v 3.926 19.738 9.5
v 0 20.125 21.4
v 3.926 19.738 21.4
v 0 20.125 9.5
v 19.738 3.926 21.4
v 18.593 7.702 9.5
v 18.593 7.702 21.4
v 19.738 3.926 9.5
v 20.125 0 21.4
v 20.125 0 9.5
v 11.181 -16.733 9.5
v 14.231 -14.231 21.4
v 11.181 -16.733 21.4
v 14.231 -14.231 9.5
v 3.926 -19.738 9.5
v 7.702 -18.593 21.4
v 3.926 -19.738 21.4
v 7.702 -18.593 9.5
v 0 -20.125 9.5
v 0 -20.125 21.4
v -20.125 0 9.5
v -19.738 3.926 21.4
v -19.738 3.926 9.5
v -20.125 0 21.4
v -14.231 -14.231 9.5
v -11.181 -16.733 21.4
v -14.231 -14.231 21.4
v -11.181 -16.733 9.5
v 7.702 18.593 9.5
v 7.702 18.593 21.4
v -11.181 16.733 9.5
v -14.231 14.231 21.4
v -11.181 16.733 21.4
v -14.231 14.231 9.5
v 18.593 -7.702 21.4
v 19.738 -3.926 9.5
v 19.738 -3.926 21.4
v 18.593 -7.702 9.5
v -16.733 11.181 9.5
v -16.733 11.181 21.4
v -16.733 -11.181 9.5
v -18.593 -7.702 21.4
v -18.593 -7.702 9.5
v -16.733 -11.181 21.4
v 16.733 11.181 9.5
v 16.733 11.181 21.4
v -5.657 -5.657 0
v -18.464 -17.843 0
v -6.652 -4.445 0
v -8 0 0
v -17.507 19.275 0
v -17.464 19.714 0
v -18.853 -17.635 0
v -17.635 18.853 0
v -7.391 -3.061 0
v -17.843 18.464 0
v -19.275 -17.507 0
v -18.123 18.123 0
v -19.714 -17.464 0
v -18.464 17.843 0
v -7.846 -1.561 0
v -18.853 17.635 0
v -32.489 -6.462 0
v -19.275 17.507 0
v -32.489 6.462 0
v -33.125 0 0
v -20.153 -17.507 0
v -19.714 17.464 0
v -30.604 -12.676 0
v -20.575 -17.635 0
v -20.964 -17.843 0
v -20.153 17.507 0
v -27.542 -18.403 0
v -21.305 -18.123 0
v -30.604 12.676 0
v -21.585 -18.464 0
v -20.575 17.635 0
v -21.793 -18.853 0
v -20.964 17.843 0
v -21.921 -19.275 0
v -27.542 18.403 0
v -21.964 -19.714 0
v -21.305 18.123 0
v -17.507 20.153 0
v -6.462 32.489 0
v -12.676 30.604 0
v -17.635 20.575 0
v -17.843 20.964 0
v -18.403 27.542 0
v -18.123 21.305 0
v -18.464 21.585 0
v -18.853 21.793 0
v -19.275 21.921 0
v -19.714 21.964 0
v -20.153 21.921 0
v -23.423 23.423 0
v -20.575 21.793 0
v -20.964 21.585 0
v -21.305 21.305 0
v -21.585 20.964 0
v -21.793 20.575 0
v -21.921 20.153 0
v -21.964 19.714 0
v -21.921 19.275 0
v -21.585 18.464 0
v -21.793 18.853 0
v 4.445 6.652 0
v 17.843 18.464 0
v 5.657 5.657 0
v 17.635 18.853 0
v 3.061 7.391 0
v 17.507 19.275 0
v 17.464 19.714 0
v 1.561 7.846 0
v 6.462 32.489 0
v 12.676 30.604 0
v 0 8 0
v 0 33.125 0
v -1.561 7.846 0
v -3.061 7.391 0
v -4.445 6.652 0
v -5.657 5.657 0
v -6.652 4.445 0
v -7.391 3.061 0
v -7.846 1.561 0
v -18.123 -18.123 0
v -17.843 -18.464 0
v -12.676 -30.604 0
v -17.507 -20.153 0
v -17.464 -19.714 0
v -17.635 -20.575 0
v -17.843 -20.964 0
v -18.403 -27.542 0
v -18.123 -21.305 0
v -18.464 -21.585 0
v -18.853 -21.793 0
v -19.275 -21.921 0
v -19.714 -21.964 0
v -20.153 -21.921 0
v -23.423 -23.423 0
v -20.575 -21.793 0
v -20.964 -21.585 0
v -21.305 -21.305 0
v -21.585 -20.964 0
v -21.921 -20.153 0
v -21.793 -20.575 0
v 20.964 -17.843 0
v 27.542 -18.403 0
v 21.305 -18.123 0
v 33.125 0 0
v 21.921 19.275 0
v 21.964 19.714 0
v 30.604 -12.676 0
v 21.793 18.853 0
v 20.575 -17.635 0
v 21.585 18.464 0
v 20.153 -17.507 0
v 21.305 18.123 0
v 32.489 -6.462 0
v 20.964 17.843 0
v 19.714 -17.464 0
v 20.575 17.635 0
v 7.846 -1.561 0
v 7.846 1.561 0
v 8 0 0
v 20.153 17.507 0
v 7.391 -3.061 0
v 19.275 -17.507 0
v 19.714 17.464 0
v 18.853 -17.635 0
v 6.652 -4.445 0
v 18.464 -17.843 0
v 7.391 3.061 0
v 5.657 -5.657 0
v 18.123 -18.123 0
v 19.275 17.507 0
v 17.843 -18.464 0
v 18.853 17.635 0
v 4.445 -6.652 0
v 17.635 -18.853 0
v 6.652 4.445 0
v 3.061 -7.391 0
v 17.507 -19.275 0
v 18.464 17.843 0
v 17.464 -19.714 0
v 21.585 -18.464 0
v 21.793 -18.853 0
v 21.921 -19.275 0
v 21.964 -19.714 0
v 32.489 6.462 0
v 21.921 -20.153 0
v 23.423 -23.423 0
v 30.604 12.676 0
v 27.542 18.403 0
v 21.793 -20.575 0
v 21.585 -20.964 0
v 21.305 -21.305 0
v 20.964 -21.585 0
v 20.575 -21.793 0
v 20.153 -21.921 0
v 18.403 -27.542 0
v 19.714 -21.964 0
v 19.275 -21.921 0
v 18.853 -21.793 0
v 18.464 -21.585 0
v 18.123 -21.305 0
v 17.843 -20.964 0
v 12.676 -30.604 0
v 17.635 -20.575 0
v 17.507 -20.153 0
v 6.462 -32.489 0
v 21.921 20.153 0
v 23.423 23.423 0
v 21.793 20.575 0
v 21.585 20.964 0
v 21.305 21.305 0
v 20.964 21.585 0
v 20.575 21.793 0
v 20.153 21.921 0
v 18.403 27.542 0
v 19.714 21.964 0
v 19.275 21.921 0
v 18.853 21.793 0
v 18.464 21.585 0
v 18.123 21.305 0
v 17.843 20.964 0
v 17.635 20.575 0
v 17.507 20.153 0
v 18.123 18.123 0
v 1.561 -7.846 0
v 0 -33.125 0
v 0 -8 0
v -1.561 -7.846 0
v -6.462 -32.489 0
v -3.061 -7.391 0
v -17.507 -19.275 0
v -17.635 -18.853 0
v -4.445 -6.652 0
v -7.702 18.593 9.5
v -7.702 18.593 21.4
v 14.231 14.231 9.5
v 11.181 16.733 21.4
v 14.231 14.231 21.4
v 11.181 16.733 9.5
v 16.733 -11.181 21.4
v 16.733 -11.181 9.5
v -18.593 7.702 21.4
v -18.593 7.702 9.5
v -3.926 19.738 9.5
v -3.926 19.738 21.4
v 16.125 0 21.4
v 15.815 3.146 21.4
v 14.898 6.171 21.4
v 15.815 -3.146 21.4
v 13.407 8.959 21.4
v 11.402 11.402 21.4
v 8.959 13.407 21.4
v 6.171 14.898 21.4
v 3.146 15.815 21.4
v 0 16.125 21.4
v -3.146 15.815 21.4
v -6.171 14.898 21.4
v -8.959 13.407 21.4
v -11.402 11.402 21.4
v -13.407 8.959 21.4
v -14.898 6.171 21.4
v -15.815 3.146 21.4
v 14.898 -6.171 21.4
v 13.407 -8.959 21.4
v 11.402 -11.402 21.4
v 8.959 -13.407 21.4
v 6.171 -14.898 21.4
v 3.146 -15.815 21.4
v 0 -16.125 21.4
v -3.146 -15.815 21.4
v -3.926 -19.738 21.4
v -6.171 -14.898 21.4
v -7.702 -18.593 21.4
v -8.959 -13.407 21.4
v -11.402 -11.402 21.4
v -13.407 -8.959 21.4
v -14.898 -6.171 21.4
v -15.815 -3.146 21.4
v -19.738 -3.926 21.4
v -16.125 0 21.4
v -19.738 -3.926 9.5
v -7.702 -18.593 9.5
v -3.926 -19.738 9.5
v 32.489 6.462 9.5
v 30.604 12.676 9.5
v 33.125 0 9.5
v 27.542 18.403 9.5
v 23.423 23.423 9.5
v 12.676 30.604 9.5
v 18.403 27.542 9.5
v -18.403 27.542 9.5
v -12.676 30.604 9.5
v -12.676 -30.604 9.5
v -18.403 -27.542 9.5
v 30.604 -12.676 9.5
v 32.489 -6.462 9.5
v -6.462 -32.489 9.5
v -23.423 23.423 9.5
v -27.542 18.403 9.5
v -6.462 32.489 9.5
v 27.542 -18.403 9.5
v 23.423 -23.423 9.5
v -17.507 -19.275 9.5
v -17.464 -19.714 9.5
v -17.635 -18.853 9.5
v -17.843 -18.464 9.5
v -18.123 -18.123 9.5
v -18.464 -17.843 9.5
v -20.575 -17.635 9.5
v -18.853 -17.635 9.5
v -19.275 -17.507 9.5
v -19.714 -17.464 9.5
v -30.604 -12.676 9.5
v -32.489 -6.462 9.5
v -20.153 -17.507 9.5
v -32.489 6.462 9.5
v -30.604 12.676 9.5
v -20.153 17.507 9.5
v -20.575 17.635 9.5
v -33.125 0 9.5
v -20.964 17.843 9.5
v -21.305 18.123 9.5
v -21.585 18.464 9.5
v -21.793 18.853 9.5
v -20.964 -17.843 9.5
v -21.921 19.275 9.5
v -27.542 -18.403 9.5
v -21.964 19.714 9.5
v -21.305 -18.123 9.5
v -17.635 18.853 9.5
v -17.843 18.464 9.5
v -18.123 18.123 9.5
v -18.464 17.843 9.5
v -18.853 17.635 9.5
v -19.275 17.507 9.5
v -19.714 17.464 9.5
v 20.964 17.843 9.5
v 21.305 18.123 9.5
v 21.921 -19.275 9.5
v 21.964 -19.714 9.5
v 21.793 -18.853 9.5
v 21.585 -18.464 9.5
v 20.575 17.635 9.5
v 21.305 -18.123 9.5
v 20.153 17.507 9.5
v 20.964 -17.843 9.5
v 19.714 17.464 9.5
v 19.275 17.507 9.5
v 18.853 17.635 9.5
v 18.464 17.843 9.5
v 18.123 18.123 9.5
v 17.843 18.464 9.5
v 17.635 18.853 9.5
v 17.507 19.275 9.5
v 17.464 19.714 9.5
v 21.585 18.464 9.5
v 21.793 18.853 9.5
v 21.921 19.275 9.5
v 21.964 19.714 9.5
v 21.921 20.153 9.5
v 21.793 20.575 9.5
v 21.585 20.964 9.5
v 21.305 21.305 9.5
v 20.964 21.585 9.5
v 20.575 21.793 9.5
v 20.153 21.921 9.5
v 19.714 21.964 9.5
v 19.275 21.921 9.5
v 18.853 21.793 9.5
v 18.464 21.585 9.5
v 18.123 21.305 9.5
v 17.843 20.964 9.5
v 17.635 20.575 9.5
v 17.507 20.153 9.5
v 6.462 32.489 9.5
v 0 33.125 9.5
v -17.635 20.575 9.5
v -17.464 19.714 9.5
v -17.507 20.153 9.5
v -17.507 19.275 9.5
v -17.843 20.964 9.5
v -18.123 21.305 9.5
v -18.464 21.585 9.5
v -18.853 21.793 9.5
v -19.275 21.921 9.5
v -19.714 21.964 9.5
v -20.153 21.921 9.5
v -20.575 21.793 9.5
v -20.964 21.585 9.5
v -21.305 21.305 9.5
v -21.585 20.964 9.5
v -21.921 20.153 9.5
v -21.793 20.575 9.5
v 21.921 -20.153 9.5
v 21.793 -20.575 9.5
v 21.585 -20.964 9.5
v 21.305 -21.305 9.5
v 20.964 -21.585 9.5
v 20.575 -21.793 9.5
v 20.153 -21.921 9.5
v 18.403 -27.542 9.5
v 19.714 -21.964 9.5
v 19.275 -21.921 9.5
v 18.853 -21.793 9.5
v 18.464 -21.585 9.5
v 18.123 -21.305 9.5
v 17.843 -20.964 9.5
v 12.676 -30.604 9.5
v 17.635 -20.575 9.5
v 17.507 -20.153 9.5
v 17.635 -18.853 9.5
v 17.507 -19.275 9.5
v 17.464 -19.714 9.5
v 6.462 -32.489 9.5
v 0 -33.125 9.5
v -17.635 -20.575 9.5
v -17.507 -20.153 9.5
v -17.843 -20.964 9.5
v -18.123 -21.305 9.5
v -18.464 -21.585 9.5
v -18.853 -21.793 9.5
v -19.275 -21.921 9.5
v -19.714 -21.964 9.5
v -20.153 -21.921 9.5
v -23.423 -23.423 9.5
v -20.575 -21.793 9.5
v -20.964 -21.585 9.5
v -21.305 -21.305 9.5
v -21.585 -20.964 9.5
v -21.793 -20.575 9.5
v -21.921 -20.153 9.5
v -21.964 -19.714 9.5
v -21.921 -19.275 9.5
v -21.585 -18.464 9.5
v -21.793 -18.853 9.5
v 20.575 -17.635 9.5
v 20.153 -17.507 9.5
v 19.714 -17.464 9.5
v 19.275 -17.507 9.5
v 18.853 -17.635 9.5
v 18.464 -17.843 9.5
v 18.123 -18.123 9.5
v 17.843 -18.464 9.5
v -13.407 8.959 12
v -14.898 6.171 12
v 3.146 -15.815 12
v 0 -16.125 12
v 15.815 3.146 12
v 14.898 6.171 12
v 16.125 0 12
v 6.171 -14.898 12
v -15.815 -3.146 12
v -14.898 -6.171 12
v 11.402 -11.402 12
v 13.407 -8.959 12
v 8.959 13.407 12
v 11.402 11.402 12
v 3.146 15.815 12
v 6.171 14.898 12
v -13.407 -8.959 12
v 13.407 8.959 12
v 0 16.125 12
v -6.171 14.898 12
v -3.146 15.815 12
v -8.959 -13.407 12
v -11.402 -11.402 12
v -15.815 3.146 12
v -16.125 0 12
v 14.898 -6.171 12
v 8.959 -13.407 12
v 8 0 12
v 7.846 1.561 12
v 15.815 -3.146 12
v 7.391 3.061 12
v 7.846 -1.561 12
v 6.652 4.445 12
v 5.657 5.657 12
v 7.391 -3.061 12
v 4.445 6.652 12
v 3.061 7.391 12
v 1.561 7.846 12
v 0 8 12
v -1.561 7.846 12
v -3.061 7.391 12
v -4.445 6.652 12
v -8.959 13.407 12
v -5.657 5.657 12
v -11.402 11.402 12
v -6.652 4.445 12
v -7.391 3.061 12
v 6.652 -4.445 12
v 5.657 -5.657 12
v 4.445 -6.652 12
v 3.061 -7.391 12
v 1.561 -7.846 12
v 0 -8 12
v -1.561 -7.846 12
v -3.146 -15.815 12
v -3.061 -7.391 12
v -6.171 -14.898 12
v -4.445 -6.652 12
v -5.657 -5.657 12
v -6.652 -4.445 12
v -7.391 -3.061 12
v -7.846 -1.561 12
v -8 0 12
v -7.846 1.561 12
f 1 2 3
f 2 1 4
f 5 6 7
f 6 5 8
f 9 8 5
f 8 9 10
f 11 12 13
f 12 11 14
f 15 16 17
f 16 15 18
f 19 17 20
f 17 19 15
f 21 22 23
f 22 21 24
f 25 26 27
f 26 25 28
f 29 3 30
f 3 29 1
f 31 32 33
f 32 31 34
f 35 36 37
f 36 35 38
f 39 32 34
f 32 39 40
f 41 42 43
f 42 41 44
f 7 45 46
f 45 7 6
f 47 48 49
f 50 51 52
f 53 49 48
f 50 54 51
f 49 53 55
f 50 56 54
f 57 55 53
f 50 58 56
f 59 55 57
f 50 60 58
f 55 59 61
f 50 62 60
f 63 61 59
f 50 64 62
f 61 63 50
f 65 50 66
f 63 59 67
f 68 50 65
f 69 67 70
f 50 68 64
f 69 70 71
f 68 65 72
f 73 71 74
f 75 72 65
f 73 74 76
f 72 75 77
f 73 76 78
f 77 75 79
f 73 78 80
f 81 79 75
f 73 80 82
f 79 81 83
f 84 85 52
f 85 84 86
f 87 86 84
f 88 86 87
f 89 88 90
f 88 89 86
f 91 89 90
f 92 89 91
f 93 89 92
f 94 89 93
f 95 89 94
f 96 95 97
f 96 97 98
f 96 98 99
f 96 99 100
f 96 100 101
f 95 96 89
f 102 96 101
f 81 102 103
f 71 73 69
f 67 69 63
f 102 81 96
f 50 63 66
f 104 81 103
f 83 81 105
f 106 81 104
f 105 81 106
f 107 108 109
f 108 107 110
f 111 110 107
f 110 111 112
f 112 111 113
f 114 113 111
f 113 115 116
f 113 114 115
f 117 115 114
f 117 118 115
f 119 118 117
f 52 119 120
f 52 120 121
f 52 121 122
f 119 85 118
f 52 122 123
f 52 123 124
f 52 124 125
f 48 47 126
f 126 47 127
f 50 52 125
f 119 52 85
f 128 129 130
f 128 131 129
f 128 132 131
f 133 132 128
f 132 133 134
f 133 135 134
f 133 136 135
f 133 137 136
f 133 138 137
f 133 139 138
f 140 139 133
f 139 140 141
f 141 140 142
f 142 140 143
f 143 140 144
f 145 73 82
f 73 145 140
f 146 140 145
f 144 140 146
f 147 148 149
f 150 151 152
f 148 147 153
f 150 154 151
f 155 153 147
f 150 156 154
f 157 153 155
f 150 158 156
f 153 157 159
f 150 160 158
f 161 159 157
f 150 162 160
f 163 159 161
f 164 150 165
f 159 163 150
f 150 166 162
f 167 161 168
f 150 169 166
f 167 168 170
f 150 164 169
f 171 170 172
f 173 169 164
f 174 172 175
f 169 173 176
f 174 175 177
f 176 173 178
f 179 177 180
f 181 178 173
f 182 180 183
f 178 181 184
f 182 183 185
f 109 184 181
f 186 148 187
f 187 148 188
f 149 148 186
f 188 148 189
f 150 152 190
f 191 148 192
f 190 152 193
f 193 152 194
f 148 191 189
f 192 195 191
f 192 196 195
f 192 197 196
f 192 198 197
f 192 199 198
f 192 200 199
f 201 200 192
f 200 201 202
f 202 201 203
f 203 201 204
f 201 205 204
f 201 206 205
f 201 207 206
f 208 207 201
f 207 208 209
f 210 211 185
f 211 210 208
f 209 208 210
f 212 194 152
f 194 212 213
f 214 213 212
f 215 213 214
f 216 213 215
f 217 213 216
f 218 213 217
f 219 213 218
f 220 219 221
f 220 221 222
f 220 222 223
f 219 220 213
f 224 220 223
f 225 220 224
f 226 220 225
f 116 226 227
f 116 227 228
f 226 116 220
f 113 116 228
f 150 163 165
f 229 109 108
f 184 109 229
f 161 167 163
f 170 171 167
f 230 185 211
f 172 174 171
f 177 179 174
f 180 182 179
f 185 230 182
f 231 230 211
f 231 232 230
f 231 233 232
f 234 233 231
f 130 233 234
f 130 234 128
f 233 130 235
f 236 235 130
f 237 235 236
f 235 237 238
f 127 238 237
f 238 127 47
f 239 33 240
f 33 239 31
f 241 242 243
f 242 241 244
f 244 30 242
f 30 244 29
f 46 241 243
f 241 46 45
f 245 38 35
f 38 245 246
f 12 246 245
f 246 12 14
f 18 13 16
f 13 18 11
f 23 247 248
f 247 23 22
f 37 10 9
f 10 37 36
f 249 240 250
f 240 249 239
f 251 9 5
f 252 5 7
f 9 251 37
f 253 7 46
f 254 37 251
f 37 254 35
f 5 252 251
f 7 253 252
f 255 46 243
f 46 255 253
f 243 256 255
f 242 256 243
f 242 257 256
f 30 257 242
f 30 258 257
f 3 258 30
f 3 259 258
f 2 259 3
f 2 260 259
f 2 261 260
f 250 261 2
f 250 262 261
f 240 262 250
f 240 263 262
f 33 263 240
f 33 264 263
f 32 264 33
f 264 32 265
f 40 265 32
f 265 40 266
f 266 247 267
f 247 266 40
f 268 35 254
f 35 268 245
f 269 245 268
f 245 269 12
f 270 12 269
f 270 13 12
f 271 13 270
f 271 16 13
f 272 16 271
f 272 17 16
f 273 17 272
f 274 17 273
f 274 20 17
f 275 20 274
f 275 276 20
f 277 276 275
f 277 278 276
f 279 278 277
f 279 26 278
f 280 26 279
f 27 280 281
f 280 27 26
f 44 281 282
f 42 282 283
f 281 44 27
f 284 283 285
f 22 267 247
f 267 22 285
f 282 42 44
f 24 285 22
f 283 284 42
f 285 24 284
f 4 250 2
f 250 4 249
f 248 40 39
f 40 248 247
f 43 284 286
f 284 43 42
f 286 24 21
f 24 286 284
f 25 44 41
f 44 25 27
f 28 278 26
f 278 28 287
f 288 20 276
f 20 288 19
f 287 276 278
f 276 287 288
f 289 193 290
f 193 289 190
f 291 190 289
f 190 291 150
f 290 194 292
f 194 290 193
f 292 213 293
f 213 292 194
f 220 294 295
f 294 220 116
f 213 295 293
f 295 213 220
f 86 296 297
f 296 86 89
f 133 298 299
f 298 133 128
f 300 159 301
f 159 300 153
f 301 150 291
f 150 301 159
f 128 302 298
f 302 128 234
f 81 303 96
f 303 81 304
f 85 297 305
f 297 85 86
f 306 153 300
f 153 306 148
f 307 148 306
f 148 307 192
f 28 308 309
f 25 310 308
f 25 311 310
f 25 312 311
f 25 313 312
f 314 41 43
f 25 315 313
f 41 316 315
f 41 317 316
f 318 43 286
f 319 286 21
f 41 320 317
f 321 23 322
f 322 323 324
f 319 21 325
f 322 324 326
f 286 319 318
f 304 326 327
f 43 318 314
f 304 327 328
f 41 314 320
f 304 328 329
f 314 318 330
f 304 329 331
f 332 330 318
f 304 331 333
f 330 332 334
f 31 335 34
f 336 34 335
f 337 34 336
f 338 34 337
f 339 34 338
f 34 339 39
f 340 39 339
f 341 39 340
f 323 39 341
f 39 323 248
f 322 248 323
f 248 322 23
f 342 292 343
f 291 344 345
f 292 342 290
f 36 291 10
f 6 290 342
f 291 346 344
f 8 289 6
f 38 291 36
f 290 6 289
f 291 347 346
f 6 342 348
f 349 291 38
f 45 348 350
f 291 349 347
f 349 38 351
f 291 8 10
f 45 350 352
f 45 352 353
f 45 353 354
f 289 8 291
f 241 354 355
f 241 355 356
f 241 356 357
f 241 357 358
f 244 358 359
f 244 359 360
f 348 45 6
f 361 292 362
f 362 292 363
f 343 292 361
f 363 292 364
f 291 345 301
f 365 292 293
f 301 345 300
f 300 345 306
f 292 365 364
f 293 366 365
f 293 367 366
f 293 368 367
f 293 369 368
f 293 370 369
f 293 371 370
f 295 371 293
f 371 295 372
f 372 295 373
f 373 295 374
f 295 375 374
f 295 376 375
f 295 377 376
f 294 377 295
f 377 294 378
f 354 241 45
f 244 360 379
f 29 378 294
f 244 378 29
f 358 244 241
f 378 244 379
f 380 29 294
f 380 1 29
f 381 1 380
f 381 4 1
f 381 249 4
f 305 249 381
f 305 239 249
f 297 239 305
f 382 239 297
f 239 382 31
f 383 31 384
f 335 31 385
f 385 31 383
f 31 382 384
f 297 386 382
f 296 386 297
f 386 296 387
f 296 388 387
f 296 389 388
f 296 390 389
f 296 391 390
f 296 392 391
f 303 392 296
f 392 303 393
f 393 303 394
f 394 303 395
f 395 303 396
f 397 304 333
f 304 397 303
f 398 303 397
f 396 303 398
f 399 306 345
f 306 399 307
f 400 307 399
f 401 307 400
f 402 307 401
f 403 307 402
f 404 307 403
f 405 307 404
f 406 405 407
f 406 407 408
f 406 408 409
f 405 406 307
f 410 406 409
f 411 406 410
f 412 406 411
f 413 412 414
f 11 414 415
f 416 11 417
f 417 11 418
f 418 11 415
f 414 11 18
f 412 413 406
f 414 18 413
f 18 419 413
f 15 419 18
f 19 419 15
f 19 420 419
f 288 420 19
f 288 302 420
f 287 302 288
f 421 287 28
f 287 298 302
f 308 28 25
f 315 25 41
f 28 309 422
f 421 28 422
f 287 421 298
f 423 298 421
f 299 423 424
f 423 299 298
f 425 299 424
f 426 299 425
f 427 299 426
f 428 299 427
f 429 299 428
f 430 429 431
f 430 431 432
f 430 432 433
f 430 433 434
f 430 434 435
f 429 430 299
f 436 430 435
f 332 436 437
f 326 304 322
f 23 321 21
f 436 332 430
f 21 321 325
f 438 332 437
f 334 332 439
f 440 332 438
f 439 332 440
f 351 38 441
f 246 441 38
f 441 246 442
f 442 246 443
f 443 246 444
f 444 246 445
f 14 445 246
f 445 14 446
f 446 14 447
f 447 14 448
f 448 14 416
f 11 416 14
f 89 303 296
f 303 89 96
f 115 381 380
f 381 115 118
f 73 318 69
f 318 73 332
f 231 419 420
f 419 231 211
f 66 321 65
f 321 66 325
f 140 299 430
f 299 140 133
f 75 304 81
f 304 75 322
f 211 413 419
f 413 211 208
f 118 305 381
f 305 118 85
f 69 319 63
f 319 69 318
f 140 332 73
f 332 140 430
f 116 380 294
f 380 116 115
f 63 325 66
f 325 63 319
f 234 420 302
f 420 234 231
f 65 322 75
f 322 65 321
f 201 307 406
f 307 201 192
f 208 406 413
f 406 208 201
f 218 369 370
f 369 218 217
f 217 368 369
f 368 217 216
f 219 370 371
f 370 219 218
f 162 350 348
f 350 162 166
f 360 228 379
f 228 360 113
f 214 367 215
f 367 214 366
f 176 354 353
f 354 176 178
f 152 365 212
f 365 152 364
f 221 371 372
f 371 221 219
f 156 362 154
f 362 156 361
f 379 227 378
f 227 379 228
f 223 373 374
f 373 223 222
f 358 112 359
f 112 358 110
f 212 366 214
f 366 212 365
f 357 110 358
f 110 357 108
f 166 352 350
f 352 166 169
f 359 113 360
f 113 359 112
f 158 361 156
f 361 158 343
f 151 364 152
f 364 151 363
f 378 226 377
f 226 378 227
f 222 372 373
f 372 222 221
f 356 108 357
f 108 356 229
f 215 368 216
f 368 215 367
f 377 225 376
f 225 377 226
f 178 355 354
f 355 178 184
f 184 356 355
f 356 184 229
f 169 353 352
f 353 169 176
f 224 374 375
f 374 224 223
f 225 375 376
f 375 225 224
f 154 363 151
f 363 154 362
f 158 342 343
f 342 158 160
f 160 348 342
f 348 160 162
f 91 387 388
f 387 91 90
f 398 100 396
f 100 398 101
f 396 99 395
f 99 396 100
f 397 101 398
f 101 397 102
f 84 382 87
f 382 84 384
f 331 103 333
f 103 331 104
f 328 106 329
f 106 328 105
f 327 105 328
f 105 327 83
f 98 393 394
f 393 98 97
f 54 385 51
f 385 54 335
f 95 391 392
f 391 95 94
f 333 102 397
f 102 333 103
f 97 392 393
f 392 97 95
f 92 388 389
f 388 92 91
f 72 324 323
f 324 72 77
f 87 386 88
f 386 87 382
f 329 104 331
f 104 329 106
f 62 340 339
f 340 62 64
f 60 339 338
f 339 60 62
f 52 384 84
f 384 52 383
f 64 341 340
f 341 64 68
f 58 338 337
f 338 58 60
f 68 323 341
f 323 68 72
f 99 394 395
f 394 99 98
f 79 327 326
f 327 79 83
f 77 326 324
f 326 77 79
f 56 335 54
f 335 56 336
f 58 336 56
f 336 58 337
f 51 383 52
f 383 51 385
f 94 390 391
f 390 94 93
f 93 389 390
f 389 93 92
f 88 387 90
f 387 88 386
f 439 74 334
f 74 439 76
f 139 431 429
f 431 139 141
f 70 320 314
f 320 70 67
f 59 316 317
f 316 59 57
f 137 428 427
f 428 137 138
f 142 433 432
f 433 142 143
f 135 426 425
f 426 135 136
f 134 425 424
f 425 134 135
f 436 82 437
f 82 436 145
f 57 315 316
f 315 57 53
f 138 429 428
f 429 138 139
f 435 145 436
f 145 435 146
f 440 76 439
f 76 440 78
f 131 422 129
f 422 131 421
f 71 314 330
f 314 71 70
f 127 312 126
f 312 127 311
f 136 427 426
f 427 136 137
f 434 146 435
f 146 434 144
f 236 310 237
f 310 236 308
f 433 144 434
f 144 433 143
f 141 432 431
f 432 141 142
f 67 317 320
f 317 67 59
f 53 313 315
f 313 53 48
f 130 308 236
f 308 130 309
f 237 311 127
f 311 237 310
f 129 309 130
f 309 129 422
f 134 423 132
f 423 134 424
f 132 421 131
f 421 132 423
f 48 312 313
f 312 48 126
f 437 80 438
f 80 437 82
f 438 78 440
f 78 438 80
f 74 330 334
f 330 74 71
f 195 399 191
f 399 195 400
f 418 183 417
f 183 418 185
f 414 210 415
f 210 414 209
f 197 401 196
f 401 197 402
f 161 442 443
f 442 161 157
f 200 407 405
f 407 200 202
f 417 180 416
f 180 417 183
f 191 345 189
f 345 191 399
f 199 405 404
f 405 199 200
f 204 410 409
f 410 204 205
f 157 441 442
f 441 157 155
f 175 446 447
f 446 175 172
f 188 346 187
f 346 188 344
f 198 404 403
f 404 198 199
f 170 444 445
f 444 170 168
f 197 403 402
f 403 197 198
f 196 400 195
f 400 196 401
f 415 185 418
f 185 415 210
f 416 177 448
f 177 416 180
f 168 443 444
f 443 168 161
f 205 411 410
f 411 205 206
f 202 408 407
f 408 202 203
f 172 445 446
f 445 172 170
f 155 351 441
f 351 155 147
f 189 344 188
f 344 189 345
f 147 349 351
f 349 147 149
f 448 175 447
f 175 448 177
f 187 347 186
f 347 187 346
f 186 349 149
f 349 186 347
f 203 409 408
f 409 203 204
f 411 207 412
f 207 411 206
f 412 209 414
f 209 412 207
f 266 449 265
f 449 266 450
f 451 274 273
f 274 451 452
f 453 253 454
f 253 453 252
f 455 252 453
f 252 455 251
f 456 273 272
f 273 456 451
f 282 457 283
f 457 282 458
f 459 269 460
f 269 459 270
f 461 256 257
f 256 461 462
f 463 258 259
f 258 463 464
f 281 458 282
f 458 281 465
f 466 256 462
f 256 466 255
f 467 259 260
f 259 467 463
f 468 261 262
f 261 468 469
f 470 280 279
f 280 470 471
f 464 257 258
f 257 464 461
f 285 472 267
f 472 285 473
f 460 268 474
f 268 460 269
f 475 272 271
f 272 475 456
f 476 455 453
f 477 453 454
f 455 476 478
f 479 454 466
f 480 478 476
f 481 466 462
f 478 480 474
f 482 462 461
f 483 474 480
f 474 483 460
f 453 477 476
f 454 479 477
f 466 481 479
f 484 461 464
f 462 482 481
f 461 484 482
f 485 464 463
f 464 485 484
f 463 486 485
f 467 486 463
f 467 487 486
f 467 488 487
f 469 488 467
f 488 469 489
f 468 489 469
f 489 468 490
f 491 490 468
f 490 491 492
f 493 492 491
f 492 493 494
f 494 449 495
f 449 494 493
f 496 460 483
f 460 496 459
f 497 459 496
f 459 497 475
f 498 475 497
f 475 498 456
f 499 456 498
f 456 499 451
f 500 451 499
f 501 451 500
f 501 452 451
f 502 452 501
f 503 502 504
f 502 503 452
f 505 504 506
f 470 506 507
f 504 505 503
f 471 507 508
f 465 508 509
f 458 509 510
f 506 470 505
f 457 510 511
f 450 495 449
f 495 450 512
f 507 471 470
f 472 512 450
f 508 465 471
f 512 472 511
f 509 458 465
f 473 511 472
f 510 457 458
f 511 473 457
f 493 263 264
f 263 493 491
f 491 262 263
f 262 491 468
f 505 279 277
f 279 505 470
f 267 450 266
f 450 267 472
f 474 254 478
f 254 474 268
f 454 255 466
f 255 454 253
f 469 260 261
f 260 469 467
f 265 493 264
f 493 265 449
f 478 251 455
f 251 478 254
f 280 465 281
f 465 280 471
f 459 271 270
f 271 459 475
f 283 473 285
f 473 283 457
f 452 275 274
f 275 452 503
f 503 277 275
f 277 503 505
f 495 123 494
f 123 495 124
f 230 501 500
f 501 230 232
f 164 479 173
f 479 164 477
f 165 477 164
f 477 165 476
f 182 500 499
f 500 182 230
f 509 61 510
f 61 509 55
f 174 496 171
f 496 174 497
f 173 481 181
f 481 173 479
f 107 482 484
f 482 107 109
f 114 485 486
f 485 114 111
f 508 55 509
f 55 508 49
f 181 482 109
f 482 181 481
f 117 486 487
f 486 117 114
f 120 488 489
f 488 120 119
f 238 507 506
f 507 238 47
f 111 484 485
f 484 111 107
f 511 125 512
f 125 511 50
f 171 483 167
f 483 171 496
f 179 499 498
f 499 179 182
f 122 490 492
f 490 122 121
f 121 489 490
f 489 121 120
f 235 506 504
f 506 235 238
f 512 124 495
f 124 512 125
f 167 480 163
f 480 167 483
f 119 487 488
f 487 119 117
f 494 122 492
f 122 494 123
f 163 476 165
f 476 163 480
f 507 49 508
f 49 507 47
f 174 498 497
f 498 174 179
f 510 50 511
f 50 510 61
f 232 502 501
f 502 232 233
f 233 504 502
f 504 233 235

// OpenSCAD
$fn = 32;

// ----------------------------------------------------------------------
// Bearing housing: seat for 6002 (32 x 9 mm), 40.25 mm body
// ----------------------------------------------------------------------

// --- parameters (mm) ---
housing_d = 40.25;        // housing outside diameter
housing_h = 21.4;         // overall housing height
wall_t = 4;               // wall thickness
seat_d = 32.25;           // 6002 seat, 0.25 mm clearance
seat_h = 9.4;             // pocket depth
shoulder = 4;             // shoulder under the bearing
pass_d = 16;              // shaft passage
flange_d = 66.25;         // mounting flange diameter
flange_t = 8;             // flange thickness
bolt_d = 4.5;             // flange bolt clearance
bolt_r = 27.88;           // flange bolt circle radius

module body() {
  cylinder(h = housing_h, d = housing_d);
}

module flange() {
  /* flange sunk 1.5 mm into the body */
  cylinder(h = flange_t + 1.5, d = flange_d);
}

difference() {
  union() {
    body();
    flange();
  }
  translate([0, 0, housing_h - seat_h]) cylinder(h = seat_h + 1, d = seat_d);
  translate([0, 0, -1]) cylinder(h = housing_h - seat_h + 1, d = pass_d);
  for (i = [0 : 3]) rotate([0, 0, 45 + i * 90]) translate([bolt_r, 0, -1])
    cylinder(h = flange_t + 3, d = bolt_d);
}
